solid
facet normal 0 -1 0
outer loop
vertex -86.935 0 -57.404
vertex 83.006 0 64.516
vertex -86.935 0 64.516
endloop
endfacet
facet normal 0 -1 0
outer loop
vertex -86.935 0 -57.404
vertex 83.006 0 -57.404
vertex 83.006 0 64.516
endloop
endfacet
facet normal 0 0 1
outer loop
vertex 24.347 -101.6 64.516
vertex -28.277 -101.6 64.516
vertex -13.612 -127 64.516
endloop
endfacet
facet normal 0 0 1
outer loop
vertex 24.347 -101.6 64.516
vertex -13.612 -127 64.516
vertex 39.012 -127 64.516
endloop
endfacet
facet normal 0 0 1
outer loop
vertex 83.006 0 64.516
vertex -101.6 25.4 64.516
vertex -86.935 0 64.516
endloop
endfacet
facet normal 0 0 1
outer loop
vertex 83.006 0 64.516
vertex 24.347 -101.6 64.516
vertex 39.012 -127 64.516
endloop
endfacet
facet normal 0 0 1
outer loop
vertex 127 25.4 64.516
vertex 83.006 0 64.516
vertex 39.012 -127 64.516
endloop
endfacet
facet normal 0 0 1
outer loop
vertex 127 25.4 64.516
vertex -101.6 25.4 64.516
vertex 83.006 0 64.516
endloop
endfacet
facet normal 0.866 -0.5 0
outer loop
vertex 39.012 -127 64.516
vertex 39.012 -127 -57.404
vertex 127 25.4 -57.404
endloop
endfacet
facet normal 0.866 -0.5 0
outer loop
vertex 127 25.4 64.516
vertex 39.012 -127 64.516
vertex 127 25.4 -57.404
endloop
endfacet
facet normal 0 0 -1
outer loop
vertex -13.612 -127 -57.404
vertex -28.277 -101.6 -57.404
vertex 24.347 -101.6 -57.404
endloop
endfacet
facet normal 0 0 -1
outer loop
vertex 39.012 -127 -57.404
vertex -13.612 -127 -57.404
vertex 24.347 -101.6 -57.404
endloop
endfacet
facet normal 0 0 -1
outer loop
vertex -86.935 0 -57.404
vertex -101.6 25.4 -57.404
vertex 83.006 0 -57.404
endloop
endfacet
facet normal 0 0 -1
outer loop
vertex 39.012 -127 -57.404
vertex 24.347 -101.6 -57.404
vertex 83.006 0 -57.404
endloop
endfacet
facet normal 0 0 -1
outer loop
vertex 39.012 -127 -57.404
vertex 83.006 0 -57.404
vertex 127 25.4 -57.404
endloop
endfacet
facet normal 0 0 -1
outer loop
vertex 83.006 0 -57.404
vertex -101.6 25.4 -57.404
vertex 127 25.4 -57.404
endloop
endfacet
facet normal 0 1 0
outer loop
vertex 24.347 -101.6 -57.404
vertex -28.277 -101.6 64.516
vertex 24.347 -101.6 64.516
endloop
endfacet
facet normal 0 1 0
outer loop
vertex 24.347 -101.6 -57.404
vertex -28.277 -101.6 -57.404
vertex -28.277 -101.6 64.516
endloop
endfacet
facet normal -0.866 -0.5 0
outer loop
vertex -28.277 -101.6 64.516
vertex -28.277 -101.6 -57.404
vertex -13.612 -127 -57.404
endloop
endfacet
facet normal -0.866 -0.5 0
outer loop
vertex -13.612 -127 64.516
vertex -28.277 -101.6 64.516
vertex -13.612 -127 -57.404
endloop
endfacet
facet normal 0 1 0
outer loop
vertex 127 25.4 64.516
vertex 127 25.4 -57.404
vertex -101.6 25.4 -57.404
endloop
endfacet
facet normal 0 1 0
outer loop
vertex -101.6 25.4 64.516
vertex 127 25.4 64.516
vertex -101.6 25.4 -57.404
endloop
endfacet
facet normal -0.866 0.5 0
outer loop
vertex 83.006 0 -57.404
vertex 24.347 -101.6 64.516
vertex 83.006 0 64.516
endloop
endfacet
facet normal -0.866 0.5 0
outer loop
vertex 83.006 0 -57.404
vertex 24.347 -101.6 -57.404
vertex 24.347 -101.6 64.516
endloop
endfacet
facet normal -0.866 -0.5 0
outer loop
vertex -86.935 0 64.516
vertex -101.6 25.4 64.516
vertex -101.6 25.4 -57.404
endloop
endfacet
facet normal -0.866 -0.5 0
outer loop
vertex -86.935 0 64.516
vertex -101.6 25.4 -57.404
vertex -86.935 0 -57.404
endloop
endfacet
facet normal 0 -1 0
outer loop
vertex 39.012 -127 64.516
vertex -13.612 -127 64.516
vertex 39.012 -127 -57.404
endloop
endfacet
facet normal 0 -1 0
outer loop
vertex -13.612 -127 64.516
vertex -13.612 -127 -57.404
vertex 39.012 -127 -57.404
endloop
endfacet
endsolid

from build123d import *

# Parameters (mm, degrees)
F1_DEPTH      = 57.404
F1_DEPTH_BACK = 64.516
F2_T          = -25.4


with BuildPart() as f1:
    # F0 (on Top) → F1 (new body, two sides)
    with BuildSketch(Plane.XY) as f1_sk:
        Polygon((127, 25.4), (-101.6, 25.4), (-13.6118189755, -127), (39.0118189755, -127), align=None)
    extrude(amount=-F1_DEPTH)
    extrude(f1_sk.sketch, amount=F1_DEPTH_BACK)

    # F2
    f2_openings = [f1.faces().sort_by_distance(p)[0] for p in [
        (12.7, -34.905889, 64.516),
        (12.7, -34.905889, -57.404),
        (-57.605909, -50.8, 3.556),
    ]]
    offset(amount=F2_T, openings=f2_openings)


solid = f1.part
